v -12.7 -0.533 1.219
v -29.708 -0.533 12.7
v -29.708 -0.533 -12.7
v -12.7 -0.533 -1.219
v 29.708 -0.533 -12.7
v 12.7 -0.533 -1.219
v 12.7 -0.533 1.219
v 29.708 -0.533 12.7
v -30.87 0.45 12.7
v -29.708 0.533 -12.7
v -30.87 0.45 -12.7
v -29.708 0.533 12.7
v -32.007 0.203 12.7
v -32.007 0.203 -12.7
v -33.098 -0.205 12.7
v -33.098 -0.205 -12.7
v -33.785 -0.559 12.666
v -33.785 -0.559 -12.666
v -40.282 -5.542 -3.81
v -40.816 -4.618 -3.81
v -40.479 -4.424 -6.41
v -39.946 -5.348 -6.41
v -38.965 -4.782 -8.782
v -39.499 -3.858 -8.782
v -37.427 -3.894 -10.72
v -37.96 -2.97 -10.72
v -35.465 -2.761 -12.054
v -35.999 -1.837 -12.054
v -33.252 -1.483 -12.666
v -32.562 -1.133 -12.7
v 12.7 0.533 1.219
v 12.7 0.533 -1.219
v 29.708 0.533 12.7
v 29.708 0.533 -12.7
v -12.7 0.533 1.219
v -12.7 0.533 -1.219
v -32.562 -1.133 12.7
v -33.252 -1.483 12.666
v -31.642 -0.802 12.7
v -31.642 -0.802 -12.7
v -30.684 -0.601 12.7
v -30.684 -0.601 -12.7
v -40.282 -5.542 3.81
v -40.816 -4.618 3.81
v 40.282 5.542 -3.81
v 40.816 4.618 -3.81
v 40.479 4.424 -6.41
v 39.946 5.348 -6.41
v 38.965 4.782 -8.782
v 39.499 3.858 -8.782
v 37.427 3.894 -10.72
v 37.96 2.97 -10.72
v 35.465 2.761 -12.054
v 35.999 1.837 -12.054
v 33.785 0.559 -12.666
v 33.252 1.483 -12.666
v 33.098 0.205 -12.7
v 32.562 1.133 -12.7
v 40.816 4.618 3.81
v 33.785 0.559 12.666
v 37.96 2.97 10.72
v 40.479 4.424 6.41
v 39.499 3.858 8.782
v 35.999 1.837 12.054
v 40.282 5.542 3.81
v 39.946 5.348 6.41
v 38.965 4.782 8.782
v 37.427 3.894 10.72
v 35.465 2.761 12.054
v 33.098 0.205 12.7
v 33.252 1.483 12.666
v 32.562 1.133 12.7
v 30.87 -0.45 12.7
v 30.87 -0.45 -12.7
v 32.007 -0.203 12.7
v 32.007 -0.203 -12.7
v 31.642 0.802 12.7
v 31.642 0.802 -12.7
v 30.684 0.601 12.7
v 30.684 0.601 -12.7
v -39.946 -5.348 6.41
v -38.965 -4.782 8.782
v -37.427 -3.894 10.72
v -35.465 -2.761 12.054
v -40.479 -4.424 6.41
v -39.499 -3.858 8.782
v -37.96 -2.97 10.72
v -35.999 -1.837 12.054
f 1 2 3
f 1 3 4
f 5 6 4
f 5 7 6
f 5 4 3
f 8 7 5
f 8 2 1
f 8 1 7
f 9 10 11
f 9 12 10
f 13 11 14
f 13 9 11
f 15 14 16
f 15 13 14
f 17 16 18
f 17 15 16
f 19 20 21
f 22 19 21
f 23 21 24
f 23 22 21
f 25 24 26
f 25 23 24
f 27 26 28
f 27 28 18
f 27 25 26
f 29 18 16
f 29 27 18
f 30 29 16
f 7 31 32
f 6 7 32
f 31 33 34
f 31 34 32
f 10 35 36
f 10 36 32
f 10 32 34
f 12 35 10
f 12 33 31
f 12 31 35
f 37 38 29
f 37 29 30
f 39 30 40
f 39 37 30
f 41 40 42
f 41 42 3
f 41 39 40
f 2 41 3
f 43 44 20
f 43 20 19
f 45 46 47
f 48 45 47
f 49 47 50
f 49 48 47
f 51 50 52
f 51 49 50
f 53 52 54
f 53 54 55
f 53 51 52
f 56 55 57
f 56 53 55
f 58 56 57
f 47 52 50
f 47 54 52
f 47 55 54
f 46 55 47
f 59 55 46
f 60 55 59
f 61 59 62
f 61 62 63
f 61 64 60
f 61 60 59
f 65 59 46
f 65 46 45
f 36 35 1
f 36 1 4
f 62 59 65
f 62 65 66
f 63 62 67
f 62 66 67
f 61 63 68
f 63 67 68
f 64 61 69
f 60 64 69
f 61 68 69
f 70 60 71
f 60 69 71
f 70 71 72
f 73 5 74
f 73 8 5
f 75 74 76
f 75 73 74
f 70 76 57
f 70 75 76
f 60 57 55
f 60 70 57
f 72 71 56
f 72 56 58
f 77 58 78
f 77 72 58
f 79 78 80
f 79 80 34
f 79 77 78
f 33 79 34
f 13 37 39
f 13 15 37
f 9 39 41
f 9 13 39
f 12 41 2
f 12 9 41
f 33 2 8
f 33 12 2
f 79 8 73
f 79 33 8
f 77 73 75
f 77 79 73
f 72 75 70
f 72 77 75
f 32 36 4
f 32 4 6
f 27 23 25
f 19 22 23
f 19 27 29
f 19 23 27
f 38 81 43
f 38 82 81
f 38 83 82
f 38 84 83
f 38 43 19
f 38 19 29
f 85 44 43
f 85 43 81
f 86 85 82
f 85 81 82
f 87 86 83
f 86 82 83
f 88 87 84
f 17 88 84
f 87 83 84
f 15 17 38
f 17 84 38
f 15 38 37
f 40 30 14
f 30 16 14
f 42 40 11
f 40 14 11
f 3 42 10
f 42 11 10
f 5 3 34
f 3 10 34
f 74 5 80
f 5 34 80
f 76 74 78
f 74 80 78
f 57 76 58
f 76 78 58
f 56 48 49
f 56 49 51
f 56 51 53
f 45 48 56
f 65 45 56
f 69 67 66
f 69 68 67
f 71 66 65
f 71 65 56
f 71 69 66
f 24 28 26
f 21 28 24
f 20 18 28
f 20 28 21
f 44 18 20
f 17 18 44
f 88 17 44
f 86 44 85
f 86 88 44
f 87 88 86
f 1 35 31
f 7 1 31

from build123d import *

# Parameters (mm, degrees)
EXTRUDE_THIN1_DEPTH = 12.7
FILLET1_R           = 8.89
SKETCH2_W           = 25.4
SKETCH2_H           = 2.4384
CUT_EXTRUDE1_DEPTH  = 44.175296885


with BuildPart() as part:
    # Sketch1 → Extrude-Thin1 (new, symmetric)
    with BuildSketch(Plane.XY):
        with BuildLine():
            Line((-40.282118102, -5.54193795), (-33.251527154, -1.482824374))
            ThreePointArc((-33.251527154, -1.482824374), (-31.542374199, -0.774870039), (-29.708227154, -0.5334))
            Line((-29.708227154, -0.5334), (29.708227154, -0.5334))
            ThreePointArc((29.708227154, -0.5334), (31.818482356, -0.255579632), (33.784927154, 0.558948473))
            Line((33.784927154, 0.558948473), (40.815518102, 4.61806205))
            Line((40.815518102, 4.61806205), (40.282118102, 5.54193795))
            Line((40.282118102, 5.54193795), (33.251527154, 1.482824374))
            ThreePointArc((33.251527154, 1.482824374), (31.542374199, 0.774870039), (29.708227154, 0.5334))
            Line((29.708227154, 0.5334), (-29.708227154, 0.5334))
            ThreePointArc((-29.708227154, 0.5334), (-31.818482356, 0.255579632), (-33.784927154, -0.558948473))
            Line((-33.784927154, -0.558948473), (-40.815518102, -4.61806205))
            Line((-40.815518102, -4.61806205), (-40.282118102, -5.54193795))
        make_face()
    extrude(amount=EXTRUDE_THIN1_DEPTH, both=True)

    # Fillet1
    fillet1_edges = [part.edges().sort_by_distance(p)[0] for p in [
        (40.548818102, 5.08, -12.7),
        (40.548818102, 5.08, 12.7),
        (-40.548818102, -5.08, -12.7),
        (-40.548818102, -5.08, 12.7),
    ]]
    fillet(fillet1_edges, radius=FILLET1_R)

    # Sketch2 → Cut-Extrude1 (cut, through all)
    with BuildSketch(Plane(origin=(0, 0.5334, 0), x_dir=(1, 0, 0), z_dir=(0, 1, 0))):
        Rectangle(SKETCH2_W, SKETCH2_H)
    extrude(amount=-CUT_EXTRUDE1_DEPTH, mode=Mode.SUBTRACT)


solid = part.part
